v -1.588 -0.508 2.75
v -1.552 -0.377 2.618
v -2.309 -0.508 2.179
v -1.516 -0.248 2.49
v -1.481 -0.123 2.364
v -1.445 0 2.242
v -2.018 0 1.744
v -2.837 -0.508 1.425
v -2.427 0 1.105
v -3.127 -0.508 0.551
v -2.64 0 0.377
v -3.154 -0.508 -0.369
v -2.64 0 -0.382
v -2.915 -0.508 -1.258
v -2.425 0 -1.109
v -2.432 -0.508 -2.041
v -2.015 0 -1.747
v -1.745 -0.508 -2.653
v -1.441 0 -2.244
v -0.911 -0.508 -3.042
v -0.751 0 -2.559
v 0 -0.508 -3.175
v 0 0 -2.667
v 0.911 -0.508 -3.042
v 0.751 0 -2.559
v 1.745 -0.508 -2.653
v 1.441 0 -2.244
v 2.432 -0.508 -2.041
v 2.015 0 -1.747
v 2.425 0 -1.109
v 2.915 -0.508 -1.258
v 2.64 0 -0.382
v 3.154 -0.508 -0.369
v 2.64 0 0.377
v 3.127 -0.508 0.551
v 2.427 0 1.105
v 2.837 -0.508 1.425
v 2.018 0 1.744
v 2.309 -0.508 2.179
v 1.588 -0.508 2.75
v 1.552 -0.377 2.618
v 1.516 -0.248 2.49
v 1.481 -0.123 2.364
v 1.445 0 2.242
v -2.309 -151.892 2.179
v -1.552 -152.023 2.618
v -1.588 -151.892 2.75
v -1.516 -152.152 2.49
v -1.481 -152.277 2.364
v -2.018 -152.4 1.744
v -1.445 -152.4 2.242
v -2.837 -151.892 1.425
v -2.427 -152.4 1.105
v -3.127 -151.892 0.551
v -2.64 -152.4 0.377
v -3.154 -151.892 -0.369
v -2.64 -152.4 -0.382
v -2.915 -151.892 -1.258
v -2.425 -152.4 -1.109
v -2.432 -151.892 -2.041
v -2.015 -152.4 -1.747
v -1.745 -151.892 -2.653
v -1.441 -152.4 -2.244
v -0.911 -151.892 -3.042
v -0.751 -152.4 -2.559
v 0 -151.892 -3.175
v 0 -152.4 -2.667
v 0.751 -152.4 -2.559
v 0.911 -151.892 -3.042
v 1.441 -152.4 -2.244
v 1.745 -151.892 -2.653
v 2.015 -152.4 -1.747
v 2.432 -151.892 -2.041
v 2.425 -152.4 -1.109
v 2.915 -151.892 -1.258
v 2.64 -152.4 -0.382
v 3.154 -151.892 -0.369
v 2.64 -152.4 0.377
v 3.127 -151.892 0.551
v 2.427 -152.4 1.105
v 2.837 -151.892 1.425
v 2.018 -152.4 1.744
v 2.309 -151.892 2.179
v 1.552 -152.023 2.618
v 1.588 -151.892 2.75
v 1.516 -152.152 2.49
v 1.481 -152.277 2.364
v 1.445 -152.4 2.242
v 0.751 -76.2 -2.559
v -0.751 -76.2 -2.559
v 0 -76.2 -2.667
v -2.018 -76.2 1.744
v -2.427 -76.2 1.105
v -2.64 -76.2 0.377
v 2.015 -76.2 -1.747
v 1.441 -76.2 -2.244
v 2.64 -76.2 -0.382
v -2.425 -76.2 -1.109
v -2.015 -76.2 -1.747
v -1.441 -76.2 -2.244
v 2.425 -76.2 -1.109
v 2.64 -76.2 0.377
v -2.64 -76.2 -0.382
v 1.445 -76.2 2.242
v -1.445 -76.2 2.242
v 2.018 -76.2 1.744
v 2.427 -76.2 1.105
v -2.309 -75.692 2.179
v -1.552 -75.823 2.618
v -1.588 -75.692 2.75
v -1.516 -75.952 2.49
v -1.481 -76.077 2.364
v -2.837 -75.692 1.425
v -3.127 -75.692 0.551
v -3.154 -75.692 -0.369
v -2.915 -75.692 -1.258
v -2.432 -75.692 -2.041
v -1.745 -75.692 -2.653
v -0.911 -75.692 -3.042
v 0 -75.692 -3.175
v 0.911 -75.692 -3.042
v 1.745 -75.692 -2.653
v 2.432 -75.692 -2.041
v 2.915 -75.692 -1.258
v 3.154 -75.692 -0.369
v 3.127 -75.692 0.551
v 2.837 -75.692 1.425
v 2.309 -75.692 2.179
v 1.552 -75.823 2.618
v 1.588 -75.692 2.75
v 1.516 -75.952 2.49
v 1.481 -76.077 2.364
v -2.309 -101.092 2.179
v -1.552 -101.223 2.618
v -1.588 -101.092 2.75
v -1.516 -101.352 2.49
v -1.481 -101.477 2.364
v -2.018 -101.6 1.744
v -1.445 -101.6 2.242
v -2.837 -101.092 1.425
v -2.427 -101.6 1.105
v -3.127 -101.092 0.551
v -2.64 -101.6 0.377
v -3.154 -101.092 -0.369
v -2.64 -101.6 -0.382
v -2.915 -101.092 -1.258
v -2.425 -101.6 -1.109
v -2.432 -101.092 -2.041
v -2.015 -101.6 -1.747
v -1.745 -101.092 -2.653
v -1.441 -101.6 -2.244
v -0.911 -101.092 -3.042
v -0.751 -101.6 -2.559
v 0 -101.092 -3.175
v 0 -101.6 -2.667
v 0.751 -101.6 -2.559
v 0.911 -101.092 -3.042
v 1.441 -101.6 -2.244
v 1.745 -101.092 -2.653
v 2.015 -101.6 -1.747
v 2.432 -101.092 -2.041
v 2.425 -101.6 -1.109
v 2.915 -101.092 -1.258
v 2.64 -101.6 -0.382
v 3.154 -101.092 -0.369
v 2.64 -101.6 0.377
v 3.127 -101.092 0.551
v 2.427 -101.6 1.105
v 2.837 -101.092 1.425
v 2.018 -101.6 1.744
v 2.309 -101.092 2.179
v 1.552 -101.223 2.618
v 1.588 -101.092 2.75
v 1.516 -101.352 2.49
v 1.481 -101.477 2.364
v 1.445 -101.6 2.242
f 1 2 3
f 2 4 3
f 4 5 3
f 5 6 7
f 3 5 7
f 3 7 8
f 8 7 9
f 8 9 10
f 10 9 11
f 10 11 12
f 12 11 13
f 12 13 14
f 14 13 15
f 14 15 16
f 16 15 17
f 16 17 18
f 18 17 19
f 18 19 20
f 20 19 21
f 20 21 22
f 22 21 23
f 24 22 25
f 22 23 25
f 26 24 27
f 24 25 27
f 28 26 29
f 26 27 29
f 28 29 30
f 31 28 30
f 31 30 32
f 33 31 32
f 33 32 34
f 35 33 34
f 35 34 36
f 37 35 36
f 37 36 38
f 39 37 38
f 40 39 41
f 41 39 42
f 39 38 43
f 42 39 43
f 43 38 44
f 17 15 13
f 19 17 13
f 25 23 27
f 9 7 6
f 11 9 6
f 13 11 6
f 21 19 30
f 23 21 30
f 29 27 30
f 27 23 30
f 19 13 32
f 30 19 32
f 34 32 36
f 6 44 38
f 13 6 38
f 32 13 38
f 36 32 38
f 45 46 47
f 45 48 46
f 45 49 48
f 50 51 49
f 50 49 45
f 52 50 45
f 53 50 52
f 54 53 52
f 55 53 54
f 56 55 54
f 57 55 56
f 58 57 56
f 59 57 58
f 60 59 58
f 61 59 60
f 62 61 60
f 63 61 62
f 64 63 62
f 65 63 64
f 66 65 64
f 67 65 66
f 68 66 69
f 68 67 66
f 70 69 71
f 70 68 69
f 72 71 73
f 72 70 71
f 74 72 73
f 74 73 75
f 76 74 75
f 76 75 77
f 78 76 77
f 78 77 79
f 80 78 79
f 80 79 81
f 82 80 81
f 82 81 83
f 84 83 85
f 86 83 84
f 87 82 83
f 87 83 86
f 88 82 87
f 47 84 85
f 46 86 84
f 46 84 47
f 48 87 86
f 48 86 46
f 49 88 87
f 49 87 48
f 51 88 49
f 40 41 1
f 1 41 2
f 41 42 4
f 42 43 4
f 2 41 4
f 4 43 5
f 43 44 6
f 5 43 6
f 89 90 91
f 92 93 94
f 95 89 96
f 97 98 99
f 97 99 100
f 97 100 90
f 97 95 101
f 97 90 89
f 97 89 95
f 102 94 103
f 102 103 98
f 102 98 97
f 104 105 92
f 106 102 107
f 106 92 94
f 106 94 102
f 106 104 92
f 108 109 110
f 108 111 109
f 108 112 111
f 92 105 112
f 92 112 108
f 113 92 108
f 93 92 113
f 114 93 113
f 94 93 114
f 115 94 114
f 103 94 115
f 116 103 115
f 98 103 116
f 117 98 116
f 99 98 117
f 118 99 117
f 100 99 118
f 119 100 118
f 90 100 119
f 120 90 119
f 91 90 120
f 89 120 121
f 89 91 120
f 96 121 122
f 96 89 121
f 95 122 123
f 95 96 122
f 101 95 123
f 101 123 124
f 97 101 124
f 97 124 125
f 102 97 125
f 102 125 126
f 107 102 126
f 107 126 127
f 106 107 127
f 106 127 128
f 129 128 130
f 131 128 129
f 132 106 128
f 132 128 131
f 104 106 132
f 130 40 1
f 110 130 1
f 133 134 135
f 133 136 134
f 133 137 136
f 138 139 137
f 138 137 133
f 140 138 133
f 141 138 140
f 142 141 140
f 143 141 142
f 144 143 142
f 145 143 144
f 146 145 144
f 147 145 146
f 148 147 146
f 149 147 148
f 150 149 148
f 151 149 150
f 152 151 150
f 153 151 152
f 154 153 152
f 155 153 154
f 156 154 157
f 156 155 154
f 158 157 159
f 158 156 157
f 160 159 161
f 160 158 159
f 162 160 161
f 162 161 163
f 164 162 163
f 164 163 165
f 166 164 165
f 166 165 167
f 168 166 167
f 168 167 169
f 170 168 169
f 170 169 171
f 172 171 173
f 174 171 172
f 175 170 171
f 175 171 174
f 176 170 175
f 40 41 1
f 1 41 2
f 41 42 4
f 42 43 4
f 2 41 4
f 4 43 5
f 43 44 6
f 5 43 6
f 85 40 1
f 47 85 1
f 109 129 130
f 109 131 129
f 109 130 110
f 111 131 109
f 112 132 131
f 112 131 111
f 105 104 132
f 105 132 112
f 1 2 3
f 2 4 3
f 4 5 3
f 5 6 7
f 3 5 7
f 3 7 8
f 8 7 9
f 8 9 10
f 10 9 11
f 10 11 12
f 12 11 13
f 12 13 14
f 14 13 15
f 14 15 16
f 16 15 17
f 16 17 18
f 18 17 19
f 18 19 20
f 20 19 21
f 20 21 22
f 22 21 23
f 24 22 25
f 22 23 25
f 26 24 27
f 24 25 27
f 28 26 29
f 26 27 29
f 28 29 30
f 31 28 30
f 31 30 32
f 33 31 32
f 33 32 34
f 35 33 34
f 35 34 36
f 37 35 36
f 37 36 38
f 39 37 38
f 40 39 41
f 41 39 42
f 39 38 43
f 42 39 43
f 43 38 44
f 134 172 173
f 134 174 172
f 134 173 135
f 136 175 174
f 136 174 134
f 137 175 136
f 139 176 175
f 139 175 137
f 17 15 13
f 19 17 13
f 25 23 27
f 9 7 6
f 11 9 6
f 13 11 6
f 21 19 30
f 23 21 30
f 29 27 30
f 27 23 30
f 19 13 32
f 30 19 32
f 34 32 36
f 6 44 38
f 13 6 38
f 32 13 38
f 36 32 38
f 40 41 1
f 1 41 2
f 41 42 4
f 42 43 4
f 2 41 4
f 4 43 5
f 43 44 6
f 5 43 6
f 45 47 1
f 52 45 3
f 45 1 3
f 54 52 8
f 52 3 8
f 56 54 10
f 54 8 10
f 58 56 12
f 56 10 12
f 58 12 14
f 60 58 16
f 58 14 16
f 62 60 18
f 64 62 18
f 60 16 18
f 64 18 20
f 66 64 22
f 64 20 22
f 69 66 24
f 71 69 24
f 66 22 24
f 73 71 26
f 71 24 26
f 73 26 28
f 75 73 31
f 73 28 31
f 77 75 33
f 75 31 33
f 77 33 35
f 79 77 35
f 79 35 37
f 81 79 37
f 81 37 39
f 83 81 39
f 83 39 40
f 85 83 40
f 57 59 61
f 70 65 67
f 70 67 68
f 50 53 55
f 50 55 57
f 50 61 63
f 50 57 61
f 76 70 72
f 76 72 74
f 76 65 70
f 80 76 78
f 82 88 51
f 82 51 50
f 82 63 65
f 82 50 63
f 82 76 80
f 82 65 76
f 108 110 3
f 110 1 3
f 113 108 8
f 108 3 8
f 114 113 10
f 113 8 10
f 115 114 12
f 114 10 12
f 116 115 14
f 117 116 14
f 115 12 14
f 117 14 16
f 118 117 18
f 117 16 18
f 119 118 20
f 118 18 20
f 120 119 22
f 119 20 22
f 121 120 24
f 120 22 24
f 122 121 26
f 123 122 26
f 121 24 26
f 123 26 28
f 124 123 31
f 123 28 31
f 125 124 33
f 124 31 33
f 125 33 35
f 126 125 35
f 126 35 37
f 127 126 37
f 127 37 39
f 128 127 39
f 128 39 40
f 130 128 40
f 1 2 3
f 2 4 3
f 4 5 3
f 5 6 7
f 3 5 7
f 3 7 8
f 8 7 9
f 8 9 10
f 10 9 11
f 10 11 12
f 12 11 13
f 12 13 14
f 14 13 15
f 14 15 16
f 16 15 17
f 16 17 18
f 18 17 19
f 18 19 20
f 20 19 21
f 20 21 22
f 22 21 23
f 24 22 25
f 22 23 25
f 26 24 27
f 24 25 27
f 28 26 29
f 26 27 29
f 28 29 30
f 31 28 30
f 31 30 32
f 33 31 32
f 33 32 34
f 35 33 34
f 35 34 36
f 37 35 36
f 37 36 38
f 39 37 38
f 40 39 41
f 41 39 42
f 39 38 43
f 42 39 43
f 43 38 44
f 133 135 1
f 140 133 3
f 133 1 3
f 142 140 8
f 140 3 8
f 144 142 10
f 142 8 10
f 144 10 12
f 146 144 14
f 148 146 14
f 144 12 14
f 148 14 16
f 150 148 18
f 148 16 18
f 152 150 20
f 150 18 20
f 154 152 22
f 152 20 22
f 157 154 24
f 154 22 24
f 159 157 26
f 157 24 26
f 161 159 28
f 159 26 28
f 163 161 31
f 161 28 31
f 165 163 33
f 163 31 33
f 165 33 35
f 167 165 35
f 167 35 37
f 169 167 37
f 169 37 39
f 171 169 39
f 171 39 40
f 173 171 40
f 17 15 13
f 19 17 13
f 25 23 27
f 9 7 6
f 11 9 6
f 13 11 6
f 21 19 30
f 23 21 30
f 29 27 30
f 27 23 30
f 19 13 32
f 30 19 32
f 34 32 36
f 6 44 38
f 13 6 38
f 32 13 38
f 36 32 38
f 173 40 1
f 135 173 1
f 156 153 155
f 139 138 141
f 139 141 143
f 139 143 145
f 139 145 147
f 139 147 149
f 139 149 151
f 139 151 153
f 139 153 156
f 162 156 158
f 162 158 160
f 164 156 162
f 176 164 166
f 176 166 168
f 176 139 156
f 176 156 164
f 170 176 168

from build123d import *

# Parameters (mm, degrees)
F1_DEPTH     = 152.4
F2_DEPTH     = 76.2
F3_DEPTH     = 101.6
F4_C1_SIZE   = 0.508
F4_C2_SIZE   = 0.508
F4_C3_SIZE   = 0.508
F4_C4_SIZE   = 0.508
F4_2_C1_SIZE = 0.508
F4_2_C2_SIZE = 0.508
F4_2_C3_SIZE = 0.508
F4_2_C4_SIZE = 0.508
F4_3_C1_SIZE = 0.508
F4_3_C2_SIZE = 0.508
F4_3_C3_SIZE = 0.508
F4_3_C4_SIZE = 0.508


with BuildPart() as f1:
    # F0 (on Front) → F1 (new body)
    with BuildSketch(Plane.XZ):
        with BuildLine():
            Line((1.5875, 2.749630657), (-1.5875, 2.749630657))
            ThreePointArc((-1.5875, 2.749630657), (0, -3.175), (1.5875, 2.749630657))
        make_face()
    extrude(amount=F1_DEPTH)

    # F4: chamfer of 0.508 on 4 edges, made by hand

    # F4_c1
    f4_c1_edges = [f1.edges().sort_by_distance(p)[0] for p in [
        (0, 0, 2.749630657),
    ]]
    chamfer(f4_c1_edges, length=F4_C1_SIZE)

    # F4_c2
    f4_c2_edges = [f1.edges().sort_by_distance(p)[0] for p in [
        (0, -152.4, 2.749630657),
    ]]
    chamfer(f4_c2_edges, length=F4_C2_SIZE)

    # F4_c3
    f4_c3_edges = [f1.edges().sort_by_distance(p)[0] for p in [
        (0, 0, -3.175),
    ]]
    chamfer(f4_c3_edges, length=F4_C3_SIZE)

    # F4_c4
    f4_c4_edges = [f1.edges().sort_by_distance(p)[0] for p in [
        (0, -152.4, -3.175),
    ]]
    chamfer(f4_c4_edges, length=F4_C4_SIZE)


with BuildPart() as f2:
    # F0 (on Front) → F2 (new body)
    with BuildSketch(Plane.XZ):
        with BuildLine():
            Line((1.5875, 2.749630657), (-1.5875, 2.749630657))
            ThreePointArc((-1.5875, 2.749630657), (0, -3.175), (1.5875, 2.749630657))
        make_face()
    extrude(amount=F2_DEPTH)

    # F4#2: chamfer of 0.508 on 4 edges, made by hand

    # F4_2_c1
    f4_2_c1_edges = [f2.edges().sort_by_distance(p)[0] for p in [
        (0, 0, 2.749630657),
    ]]
    chamfer(f4_2_c1_edges, length=F4_2_C1_SIZE)

    # F4_2_c2
    f4_2_c2_edges = [f2.edges().sort_by_distance(p)[0] for p in [
        (0, -76.2, 2.749630657),
    ]]
    chamfer(f4_2_c2_edges, length=F4_2_C2_SIZE)

    # F4_2_c3
    f4_2_c3_edges = [f2.edges().sort_by_distance(p)[0] for p in [
        (0, 0, -3.175),
    ]]
    chamfer(f4_2_c3_edges, length=F4_2_C3_SIZE)

    # F4_2_c4
    f4_2_c4_edges = [f2.edges().sort_by_distance(p)[0] for p in [
        (0, -76.2, -3.175),
    ]]
    chamfer(f4_2_c4_edges, length=F4_2_C4_SIZE)


with BuildPart() as f3:
    # F0 (on Front) → F3 (new body)
    with BuildSketch(Plane.XZ):
        with BuildLine():
            Line((1.5875, 2.749630657), (-1.5875, 2.749630657))
            ThreePointArc((-1.5875, 2.749630657), (0, -3.175), (1.5875, 2.749630657))
        make_face()
    extrude(amount=F3_DEPTH)

    # F4#3: chamfer of 0.508 on 4 edges, made by hand

    # F4_3_c1
    f4_3_c1_edges = [f3.edges().sort_by_distance(p)[0] for p in [
        (0, 0, 2.749630657),
    ]]
    chamfer(f4_3_c1_edges, length=F4_3_C1_SIZE)

    # F4_3_c2
    f4_3_c2_edges = [f3.edges().sort_by_distance(p)[0] for p in [
        (0, -101.6, 2.749630657),
    ]]
    chamfer(f4_3_c2_edges, length=F4_3_C2_SIZE)

    # F4_3_c3
    f4_3_c3_edges = [f3.edges().sort_by_distance(p)[0] for p in [
        (0, 0, -3.175),
    ]]
    chamfer(f4_3_c3_edges, length=F4_3_C3_SIZE)

    # F4_3_c4
    f4_3_c4_edges = [f3.edges().sort_by_distance(p)[0] for p in [
        (0, -101.6, -3.175),
    ]]
    chamfer(f4_3_c4_edges, length=F4_3_C4_SIZE)


solid = Compound([f1.part, f2.part, f3.part])
